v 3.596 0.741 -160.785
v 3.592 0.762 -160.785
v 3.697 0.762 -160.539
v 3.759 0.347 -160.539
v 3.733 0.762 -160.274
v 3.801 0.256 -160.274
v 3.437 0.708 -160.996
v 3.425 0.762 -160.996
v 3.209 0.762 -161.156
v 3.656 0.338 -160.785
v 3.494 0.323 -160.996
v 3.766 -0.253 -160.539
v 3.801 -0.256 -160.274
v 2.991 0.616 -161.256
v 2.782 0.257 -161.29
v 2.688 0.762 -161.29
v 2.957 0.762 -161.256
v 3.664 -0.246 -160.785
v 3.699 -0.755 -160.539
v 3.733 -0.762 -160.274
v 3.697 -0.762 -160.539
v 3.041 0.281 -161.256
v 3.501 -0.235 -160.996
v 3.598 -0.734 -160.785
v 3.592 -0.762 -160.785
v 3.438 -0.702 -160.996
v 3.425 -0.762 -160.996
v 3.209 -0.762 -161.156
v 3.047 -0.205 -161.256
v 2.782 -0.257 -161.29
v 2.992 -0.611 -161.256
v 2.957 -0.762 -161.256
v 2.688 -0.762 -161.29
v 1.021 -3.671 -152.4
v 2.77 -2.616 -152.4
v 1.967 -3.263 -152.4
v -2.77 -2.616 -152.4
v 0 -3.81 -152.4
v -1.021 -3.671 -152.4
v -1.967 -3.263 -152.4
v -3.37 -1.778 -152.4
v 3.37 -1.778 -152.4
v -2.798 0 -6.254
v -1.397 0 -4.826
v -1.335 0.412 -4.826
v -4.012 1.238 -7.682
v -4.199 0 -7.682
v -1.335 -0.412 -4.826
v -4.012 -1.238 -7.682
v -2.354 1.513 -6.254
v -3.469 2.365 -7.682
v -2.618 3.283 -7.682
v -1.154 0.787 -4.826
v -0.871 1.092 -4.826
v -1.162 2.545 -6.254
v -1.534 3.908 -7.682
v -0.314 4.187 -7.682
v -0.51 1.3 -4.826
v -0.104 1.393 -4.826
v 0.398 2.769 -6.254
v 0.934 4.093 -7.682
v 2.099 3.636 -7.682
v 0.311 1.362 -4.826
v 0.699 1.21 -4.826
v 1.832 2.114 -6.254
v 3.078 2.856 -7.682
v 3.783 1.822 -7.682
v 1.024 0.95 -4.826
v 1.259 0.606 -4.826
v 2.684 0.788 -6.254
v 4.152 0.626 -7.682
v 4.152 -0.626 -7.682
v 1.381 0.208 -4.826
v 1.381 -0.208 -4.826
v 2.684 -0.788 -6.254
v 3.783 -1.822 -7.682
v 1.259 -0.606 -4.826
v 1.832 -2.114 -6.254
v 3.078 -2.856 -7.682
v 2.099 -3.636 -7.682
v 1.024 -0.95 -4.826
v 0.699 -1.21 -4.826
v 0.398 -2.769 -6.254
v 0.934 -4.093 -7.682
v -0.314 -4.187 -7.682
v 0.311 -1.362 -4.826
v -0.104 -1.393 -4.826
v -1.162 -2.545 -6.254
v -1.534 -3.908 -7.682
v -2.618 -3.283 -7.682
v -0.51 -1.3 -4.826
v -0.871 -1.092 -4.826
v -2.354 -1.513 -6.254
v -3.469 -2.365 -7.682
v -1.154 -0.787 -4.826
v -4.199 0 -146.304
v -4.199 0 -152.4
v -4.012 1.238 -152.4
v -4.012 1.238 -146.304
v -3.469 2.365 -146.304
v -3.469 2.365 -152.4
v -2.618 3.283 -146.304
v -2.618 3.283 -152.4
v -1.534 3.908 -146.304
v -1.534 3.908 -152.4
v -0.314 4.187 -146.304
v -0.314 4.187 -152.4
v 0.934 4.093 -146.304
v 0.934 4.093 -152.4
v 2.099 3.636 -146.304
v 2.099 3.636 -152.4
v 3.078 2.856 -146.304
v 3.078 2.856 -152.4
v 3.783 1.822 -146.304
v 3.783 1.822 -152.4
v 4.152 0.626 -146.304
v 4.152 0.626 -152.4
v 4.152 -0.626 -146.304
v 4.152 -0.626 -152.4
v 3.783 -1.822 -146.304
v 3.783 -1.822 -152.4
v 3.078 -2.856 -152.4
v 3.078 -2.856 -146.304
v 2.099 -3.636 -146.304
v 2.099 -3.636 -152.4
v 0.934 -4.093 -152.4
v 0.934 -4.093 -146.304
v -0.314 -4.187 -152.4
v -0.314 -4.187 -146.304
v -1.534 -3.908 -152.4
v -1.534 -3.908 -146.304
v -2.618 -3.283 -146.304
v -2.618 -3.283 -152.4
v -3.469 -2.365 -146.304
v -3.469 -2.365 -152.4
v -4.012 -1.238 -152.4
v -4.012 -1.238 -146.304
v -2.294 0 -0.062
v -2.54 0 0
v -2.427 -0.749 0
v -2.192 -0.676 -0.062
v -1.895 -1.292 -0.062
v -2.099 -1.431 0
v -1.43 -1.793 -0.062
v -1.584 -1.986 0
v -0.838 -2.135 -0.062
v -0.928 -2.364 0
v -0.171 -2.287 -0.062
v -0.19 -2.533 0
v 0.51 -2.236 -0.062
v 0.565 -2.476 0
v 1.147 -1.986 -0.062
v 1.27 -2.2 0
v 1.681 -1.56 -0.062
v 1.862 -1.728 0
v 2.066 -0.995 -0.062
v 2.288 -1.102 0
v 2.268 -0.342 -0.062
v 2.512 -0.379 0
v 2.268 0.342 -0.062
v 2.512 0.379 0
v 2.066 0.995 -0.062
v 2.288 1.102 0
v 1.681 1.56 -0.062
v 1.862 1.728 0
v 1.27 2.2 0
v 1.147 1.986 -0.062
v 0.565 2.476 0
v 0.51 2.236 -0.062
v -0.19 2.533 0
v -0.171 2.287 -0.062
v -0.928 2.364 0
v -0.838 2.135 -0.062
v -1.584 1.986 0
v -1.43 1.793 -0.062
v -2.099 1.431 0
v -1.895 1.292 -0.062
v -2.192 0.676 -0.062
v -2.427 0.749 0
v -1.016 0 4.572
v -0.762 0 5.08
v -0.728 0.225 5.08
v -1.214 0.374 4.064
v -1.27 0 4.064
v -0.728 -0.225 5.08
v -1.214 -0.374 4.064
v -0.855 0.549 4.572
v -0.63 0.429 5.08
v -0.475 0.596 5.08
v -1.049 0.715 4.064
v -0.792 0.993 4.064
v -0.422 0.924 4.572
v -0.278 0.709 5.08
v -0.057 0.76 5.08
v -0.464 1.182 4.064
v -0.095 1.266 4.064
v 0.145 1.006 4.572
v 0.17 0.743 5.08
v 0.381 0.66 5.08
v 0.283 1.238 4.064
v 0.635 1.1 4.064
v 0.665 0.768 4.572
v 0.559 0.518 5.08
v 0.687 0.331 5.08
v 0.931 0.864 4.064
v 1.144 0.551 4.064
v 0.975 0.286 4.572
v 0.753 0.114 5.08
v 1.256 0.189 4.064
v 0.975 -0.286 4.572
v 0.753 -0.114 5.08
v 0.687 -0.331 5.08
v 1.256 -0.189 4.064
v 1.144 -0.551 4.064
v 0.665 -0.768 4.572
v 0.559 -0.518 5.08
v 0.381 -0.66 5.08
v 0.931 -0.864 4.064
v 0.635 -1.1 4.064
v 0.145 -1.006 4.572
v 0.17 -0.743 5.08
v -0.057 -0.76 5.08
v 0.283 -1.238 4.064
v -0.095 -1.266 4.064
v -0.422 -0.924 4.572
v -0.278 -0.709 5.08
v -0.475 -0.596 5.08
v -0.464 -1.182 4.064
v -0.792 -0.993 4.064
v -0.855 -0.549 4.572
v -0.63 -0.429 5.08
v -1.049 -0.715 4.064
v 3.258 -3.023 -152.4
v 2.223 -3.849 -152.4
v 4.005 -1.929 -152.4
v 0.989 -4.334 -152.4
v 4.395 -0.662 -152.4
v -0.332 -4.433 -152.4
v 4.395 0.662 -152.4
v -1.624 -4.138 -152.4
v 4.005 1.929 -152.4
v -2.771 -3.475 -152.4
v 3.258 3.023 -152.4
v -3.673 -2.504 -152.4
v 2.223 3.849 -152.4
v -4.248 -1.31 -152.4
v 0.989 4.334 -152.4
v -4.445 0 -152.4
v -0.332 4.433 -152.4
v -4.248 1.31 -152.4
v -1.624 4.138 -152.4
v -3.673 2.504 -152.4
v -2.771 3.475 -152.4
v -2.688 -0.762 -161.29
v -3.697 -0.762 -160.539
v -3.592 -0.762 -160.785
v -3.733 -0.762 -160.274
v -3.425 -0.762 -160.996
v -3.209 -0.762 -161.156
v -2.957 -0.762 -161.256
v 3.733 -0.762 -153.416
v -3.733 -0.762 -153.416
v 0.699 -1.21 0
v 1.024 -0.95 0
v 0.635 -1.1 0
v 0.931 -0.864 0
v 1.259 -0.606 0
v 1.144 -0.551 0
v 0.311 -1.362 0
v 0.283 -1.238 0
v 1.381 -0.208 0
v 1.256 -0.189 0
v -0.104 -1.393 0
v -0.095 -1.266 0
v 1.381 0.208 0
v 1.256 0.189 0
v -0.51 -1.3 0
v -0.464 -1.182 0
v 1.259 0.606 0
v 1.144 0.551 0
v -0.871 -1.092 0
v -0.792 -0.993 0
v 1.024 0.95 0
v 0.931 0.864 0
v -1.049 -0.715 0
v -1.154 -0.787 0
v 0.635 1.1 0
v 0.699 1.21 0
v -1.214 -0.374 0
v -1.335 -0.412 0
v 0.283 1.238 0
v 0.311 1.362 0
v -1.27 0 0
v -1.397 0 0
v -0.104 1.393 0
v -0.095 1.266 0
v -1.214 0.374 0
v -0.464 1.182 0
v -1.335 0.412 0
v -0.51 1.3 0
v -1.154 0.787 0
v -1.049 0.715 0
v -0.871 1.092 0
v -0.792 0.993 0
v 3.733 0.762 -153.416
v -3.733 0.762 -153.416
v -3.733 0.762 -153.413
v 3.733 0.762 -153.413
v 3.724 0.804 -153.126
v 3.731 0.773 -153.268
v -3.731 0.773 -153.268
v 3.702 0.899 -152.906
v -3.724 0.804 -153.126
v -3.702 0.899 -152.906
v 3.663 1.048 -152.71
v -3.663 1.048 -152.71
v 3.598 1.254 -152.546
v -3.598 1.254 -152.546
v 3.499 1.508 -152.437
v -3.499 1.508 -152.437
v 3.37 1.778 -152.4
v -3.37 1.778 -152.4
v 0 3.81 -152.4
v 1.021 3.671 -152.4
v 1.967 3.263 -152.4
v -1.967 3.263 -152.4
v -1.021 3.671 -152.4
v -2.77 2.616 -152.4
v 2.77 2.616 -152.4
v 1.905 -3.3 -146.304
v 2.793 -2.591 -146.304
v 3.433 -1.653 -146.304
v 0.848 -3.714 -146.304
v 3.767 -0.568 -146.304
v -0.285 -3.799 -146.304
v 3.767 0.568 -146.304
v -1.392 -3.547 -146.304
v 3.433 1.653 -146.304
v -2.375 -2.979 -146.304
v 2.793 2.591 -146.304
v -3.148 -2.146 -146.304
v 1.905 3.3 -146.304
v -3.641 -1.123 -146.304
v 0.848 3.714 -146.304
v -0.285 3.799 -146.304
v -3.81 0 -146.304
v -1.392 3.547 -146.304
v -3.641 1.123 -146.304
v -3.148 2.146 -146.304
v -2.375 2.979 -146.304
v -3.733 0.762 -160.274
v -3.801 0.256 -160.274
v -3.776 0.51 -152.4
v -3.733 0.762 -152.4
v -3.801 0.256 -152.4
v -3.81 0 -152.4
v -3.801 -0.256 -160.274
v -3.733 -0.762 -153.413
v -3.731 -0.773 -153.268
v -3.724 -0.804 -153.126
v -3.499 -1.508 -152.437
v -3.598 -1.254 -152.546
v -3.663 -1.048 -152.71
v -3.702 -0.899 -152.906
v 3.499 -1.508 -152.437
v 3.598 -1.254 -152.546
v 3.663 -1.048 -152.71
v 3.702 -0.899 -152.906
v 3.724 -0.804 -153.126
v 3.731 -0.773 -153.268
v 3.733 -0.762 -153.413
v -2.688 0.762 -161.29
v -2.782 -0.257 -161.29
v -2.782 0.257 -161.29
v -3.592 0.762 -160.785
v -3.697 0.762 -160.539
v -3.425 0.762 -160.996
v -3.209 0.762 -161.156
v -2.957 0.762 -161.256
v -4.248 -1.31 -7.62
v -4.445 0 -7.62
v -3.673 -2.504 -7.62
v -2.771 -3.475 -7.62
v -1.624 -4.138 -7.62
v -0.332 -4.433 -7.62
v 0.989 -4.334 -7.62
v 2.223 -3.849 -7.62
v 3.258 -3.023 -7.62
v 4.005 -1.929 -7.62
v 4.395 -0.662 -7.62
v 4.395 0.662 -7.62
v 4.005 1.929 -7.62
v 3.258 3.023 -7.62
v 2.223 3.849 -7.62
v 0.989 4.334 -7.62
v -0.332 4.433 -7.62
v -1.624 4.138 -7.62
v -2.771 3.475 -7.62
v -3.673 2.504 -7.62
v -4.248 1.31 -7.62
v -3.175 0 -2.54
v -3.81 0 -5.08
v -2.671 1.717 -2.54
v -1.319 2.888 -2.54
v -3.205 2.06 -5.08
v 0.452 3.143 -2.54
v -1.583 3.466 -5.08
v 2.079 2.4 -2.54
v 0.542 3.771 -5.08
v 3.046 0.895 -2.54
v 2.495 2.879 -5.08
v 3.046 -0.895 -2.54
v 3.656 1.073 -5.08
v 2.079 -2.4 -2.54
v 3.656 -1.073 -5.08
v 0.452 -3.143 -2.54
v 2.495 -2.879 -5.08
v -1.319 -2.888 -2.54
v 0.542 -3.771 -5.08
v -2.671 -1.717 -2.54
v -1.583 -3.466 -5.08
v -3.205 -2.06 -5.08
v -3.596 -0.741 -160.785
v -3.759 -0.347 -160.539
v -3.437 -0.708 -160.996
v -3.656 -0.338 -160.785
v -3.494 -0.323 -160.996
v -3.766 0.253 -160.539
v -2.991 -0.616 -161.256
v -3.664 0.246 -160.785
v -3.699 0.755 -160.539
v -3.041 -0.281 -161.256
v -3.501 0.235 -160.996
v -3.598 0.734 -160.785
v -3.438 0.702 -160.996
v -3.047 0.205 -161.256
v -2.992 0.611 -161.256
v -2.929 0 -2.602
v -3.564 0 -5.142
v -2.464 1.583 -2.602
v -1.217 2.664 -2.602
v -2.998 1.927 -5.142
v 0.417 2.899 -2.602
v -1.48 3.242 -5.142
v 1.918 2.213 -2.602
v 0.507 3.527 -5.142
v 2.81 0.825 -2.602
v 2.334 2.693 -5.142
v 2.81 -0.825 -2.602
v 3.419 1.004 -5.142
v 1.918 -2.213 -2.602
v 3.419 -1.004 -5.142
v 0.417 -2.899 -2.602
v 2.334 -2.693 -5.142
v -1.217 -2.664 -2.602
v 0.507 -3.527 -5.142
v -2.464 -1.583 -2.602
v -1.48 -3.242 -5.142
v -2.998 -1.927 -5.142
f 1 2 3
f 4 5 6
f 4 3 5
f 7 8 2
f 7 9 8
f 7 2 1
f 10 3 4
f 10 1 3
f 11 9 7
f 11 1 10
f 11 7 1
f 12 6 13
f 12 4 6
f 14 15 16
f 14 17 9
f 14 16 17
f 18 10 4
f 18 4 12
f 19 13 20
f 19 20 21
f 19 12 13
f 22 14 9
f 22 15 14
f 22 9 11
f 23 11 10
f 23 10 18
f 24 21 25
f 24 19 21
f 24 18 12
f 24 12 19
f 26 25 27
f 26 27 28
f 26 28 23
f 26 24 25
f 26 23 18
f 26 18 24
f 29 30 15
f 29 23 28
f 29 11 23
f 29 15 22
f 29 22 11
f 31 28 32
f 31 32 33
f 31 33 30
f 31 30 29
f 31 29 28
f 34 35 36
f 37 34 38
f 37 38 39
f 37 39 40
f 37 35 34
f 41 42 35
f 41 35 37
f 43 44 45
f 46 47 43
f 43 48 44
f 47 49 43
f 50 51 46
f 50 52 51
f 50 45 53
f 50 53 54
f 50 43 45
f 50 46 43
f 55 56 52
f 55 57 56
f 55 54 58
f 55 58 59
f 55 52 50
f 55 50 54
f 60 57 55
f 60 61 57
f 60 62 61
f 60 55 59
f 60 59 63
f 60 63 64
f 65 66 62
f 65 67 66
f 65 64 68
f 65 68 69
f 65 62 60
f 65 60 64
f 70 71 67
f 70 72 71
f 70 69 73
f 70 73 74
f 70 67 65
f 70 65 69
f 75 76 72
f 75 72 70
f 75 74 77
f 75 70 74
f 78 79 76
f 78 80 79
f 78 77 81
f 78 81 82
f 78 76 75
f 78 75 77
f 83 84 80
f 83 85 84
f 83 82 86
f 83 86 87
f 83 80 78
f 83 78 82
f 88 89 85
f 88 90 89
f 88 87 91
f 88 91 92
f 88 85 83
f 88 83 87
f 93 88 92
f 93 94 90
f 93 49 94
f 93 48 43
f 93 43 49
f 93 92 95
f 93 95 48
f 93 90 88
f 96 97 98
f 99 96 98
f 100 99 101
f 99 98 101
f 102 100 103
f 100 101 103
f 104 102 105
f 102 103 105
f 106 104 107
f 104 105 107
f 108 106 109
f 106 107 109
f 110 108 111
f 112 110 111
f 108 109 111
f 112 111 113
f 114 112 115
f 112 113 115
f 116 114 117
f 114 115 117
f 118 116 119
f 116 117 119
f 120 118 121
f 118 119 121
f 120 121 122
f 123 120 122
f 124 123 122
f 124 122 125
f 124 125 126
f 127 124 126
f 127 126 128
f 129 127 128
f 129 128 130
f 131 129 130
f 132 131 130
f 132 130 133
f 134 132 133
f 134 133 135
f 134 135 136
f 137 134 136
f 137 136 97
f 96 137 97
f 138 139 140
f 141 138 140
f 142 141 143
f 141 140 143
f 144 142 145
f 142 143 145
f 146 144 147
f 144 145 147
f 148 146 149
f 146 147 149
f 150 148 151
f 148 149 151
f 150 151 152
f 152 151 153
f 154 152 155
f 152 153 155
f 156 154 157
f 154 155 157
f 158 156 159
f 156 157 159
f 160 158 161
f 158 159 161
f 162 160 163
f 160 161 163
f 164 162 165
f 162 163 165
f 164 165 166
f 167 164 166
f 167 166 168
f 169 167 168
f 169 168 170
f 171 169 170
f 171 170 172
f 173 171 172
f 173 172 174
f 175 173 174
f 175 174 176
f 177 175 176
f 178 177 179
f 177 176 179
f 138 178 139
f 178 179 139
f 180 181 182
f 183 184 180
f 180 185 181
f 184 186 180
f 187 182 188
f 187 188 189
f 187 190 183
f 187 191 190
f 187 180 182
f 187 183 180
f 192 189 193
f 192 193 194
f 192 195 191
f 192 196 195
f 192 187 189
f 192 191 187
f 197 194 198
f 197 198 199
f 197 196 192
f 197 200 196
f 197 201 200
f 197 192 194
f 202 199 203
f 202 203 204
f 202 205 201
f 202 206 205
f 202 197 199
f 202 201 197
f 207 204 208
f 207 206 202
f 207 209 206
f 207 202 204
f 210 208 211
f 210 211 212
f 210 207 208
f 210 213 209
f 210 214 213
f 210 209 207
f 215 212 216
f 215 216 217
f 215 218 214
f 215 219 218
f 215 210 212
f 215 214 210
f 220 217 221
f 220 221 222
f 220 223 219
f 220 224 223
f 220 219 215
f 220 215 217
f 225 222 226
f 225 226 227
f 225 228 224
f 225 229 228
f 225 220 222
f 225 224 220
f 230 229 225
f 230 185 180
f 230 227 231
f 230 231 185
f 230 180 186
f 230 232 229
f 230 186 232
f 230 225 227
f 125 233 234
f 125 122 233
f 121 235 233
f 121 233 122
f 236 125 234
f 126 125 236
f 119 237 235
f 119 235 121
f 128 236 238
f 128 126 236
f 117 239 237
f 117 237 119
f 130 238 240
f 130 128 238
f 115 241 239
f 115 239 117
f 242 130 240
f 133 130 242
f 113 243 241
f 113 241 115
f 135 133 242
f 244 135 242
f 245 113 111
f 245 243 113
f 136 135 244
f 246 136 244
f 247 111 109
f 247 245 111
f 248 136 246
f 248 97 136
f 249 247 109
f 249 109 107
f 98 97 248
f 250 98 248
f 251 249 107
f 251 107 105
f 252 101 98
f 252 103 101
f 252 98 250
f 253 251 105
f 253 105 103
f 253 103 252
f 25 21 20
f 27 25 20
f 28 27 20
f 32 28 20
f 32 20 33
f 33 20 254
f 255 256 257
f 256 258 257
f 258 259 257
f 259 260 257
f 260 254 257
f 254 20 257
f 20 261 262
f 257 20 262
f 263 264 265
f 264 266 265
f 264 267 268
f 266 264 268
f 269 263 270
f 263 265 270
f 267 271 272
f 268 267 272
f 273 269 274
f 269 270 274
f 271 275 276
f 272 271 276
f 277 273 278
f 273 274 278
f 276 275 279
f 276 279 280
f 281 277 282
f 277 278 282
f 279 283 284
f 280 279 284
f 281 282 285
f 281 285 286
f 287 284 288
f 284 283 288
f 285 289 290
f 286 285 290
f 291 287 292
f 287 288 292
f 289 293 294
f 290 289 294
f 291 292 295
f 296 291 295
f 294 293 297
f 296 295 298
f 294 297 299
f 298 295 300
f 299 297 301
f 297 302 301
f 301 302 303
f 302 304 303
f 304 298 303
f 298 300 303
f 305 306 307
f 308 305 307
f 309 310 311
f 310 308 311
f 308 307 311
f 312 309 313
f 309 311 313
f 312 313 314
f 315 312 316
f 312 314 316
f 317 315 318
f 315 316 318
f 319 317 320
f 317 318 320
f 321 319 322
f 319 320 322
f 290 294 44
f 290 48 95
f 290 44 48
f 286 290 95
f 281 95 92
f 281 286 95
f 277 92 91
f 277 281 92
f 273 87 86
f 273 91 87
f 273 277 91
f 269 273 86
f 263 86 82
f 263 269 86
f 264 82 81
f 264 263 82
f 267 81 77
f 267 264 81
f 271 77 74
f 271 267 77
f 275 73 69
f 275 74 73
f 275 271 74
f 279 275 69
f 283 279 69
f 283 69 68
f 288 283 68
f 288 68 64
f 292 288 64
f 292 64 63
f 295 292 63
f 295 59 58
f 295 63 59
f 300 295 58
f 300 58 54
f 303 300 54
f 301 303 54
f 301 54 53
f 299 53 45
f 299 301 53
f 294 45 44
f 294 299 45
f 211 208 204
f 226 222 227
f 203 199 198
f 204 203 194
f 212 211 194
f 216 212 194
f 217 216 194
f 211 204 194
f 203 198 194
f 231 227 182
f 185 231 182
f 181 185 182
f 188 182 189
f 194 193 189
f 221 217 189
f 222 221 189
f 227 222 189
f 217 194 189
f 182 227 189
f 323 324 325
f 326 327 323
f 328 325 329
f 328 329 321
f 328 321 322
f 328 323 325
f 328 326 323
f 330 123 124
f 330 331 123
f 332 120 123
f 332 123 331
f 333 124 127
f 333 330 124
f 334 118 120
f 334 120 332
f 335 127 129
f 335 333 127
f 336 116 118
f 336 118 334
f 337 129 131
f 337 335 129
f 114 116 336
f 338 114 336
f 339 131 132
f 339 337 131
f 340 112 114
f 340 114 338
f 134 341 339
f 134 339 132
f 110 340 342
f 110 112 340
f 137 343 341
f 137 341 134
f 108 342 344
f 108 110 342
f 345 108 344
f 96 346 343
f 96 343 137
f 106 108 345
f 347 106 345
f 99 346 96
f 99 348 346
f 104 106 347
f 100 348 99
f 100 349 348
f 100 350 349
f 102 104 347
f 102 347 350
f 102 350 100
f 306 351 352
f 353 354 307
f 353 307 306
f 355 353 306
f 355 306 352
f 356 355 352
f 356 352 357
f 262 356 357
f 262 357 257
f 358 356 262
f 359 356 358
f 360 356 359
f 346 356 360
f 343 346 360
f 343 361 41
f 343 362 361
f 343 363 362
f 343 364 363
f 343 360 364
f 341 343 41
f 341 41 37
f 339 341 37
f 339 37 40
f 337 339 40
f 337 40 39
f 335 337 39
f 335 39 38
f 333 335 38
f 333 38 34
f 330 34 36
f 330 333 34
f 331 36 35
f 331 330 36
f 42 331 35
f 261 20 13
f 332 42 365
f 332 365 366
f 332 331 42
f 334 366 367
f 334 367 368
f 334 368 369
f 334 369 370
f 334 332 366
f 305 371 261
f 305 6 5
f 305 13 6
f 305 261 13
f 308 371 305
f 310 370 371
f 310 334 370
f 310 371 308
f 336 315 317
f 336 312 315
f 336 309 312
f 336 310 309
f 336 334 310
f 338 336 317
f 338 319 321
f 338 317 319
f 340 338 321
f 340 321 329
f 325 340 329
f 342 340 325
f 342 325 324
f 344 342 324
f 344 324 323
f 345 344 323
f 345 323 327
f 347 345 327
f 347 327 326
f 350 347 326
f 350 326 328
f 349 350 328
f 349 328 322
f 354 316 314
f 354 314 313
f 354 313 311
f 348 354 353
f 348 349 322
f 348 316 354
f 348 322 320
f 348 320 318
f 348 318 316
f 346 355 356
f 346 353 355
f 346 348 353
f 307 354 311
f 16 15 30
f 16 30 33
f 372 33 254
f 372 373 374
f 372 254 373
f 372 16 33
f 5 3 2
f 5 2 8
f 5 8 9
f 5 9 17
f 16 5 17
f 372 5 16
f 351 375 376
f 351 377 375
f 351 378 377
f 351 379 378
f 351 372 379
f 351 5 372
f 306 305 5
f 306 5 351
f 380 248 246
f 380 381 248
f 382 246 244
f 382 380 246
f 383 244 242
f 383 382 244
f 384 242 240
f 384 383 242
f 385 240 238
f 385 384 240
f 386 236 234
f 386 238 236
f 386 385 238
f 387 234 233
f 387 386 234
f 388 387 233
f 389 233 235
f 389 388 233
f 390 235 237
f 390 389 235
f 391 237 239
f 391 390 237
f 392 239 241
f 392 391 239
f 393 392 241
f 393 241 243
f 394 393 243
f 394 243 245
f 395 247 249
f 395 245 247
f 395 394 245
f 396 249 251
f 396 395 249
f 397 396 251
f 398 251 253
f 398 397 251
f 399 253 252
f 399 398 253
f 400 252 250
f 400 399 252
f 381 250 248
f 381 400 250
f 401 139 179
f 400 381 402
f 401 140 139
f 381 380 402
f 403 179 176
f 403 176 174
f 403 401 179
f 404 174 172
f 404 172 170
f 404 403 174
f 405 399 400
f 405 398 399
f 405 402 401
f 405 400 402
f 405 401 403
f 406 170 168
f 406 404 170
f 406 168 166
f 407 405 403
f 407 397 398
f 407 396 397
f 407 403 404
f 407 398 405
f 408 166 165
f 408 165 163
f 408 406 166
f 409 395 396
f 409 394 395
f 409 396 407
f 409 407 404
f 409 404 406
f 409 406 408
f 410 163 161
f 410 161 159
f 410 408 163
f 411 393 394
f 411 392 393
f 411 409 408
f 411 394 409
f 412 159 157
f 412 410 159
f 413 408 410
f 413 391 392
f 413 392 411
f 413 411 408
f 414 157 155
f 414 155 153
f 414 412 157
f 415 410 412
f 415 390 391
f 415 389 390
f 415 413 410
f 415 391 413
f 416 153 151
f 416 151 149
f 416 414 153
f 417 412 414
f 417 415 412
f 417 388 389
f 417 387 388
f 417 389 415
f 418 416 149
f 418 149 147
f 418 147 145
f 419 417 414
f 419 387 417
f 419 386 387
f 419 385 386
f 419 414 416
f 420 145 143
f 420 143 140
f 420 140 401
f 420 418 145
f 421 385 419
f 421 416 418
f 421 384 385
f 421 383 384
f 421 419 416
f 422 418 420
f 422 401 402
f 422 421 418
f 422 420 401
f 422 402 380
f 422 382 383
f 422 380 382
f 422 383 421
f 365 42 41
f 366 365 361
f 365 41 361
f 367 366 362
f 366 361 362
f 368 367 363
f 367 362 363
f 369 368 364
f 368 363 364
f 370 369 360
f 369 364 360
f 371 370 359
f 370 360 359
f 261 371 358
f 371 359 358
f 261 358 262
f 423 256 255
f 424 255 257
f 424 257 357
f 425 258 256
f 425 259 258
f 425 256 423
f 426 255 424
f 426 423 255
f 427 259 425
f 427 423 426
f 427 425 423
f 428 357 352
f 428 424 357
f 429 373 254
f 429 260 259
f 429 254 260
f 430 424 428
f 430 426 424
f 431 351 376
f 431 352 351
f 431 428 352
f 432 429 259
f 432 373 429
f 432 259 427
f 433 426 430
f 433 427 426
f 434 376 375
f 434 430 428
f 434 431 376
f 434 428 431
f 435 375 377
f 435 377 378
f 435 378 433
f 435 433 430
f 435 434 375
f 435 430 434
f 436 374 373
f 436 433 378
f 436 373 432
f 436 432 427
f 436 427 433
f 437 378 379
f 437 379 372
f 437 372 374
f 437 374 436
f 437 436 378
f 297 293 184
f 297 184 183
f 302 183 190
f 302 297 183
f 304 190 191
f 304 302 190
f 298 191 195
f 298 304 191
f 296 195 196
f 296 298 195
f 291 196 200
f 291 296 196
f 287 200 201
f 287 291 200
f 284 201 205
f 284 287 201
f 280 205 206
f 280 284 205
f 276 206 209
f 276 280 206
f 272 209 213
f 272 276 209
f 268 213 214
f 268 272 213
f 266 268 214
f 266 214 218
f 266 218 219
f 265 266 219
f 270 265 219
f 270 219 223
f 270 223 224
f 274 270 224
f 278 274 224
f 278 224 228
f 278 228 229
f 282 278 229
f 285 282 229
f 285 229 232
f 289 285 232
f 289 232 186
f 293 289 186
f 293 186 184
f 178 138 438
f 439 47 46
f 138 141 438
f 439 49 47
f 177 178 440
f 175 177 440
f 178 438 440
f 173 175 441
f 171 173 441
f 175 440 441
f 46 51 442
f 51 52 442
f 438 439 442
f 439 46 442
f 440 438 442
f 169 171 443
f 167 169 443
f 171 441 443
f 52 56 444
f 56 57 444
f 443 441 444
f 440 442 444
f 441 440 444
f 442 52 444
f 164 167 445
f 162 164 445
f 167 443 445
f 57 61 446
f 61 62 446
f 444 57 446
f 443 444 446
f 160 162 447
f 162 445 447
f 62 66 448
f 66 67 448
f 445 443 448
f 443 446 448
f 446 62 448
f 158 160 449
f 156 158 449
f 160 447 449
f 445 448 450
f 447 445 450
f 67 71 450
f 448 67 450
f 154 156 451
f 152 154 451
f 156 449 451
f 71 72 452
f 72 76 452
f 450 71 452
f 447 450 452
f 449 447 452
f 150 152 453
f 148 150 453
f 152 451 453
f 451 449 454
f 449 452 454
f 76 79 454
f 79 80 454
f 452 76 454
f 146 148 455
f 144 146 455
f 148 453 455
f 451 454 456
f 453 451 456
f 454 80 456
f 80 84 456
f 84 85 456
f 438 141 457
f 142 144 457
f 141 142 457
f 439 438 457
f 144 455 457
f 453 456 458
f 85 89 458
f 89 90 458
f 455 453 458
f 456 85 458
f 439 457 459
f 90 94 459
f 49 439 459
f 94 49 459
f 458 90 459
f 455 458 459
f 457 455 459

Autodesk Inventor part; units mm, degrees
ref_plane "YZ Plane" through (0, 0, 0) normal (1, 0, 0) x (0, 1, 0)
ref_plane "XZ Plane" through (0, 0, 0) normal (0, 1, 0) x (-1, 0, 0)
ref_plane "XY Plane" through (0, 0, 0) normal (0, 0, 1) x (1, 0, 0)
sketch "Sketch1" plane through (0, 0, 0) normal (0, 1, 0) x (-1, 0, 0)
  line L0 (0, 0) -> (0, -152.4)
  line L1 (0, 0) -> (0, 5.08)
  line L2 (0, 5.08) -> (1.27, 5.08)
  line L3 (1.27, 5.08) -> (1.27, 0)
  line L4 (1.27, 0) -> (0, 0)
  line L5 (0, 0) -> (0, -4.826)
  line L6 (0, -4.826) -> (1.397, -4.826)
  line L7 (1.397, -4.826) -> (1.397, 0)
  line L8 (1.397, 0) -> (1.27, 0)
  line L9 (0, 0) -> (0, -7.62)
  line L10 (4.445, -7.62) -> (2.54, 0)
  line L11 (4.445, -152.4) -> (4.445, -7.62)
  line L12 (2.54, 0) -> (2.2936, -0.0616)
  line L13 (2.2936, -0.0616) -> (4.1986, -7.6816)
  line L14 (4.1986, -7.6816) -> (4.1986, -152.4)
  line L15 (4.1986, -152.4) -> (4.445, -152.4)
  line L16 (1.397, -4.826) -> (4.1986, -7.6816)
  line L17 (0, -152.4) -> (3.81, -152.4)
  line L18 (3.81, -152.4) -> (3.81, -146.304)
  line L19 (3.81, -146.304) -> (0, -146.304)
  line L20 (3.81, -146.304) -> (4.445, -146.304)
  dimension "d0" = 152.4
  dimension "d1" = 5.08
  dimension "d2" = 1.27
  dimension "d3" = 4.826
  dimension "d4" = 1.397
  dimension "d5" = 2.54
  dimension "d6" = 7.62
  dimension "d7" = 4.445
  dimension "d8" = 4.445
  dimension "d9" = 0.254
  dimension "d10" = 3.81
  dimension "d11" = 6.096
  dimension "d21" = 0.2464
revolve "Revolution1" add sketch "Sketch1" angle 360 about axis through (0, 0, 0) along (0, 0, -1)
sketch "Sketch2" plane through (0, 0, -152.4) normal (0, 0, -1) x (-1, 0, 0)
  line L0 (0, 0) -> (0, -0.762)
  line L1 (0, -0.762) -> (3.733, -0.762)
  circle A0 centre (0, 0) radius 3.81 projected
  line L2 (0, -0.762) -> (-3.733, -0.762)
  line L3 (0, 0) -> (0, 0.762)
  line L4 (0, 0.762) -> (3.733, 0.762)
  line L5 (0, 0.762) -> (-3.733, 0.762)
  dimension "d13" = 0.762
  dimension "d14" = 0.762
extrude "Extrusion1" add sketch "Sketch2" along normal blind 8.89 contours L3 L4 A0 L1 L0 | L0 L2 A0 L5 L3
fillet "Fillet1" radius 1.016 4 edges at (-3.81, 0, -161.29) (3.81, 0, -161.29) (0, 0.762, -152.4) (0, -0.762, -152.4)
chamfer "Chamfer1" distance 1.016 distance2 0.508 1 edges at (1.27, 0, 5.08) measured on face at (-1.2659, -0.1022, 1.6933)
sketch "Sketch3" plane through (-3.733, -0.762, -153.416) normal (0, -1, 0) x (1, 0, 0)
  point P0 (3.733, 153.416)
properties part number "Pencil Body"
